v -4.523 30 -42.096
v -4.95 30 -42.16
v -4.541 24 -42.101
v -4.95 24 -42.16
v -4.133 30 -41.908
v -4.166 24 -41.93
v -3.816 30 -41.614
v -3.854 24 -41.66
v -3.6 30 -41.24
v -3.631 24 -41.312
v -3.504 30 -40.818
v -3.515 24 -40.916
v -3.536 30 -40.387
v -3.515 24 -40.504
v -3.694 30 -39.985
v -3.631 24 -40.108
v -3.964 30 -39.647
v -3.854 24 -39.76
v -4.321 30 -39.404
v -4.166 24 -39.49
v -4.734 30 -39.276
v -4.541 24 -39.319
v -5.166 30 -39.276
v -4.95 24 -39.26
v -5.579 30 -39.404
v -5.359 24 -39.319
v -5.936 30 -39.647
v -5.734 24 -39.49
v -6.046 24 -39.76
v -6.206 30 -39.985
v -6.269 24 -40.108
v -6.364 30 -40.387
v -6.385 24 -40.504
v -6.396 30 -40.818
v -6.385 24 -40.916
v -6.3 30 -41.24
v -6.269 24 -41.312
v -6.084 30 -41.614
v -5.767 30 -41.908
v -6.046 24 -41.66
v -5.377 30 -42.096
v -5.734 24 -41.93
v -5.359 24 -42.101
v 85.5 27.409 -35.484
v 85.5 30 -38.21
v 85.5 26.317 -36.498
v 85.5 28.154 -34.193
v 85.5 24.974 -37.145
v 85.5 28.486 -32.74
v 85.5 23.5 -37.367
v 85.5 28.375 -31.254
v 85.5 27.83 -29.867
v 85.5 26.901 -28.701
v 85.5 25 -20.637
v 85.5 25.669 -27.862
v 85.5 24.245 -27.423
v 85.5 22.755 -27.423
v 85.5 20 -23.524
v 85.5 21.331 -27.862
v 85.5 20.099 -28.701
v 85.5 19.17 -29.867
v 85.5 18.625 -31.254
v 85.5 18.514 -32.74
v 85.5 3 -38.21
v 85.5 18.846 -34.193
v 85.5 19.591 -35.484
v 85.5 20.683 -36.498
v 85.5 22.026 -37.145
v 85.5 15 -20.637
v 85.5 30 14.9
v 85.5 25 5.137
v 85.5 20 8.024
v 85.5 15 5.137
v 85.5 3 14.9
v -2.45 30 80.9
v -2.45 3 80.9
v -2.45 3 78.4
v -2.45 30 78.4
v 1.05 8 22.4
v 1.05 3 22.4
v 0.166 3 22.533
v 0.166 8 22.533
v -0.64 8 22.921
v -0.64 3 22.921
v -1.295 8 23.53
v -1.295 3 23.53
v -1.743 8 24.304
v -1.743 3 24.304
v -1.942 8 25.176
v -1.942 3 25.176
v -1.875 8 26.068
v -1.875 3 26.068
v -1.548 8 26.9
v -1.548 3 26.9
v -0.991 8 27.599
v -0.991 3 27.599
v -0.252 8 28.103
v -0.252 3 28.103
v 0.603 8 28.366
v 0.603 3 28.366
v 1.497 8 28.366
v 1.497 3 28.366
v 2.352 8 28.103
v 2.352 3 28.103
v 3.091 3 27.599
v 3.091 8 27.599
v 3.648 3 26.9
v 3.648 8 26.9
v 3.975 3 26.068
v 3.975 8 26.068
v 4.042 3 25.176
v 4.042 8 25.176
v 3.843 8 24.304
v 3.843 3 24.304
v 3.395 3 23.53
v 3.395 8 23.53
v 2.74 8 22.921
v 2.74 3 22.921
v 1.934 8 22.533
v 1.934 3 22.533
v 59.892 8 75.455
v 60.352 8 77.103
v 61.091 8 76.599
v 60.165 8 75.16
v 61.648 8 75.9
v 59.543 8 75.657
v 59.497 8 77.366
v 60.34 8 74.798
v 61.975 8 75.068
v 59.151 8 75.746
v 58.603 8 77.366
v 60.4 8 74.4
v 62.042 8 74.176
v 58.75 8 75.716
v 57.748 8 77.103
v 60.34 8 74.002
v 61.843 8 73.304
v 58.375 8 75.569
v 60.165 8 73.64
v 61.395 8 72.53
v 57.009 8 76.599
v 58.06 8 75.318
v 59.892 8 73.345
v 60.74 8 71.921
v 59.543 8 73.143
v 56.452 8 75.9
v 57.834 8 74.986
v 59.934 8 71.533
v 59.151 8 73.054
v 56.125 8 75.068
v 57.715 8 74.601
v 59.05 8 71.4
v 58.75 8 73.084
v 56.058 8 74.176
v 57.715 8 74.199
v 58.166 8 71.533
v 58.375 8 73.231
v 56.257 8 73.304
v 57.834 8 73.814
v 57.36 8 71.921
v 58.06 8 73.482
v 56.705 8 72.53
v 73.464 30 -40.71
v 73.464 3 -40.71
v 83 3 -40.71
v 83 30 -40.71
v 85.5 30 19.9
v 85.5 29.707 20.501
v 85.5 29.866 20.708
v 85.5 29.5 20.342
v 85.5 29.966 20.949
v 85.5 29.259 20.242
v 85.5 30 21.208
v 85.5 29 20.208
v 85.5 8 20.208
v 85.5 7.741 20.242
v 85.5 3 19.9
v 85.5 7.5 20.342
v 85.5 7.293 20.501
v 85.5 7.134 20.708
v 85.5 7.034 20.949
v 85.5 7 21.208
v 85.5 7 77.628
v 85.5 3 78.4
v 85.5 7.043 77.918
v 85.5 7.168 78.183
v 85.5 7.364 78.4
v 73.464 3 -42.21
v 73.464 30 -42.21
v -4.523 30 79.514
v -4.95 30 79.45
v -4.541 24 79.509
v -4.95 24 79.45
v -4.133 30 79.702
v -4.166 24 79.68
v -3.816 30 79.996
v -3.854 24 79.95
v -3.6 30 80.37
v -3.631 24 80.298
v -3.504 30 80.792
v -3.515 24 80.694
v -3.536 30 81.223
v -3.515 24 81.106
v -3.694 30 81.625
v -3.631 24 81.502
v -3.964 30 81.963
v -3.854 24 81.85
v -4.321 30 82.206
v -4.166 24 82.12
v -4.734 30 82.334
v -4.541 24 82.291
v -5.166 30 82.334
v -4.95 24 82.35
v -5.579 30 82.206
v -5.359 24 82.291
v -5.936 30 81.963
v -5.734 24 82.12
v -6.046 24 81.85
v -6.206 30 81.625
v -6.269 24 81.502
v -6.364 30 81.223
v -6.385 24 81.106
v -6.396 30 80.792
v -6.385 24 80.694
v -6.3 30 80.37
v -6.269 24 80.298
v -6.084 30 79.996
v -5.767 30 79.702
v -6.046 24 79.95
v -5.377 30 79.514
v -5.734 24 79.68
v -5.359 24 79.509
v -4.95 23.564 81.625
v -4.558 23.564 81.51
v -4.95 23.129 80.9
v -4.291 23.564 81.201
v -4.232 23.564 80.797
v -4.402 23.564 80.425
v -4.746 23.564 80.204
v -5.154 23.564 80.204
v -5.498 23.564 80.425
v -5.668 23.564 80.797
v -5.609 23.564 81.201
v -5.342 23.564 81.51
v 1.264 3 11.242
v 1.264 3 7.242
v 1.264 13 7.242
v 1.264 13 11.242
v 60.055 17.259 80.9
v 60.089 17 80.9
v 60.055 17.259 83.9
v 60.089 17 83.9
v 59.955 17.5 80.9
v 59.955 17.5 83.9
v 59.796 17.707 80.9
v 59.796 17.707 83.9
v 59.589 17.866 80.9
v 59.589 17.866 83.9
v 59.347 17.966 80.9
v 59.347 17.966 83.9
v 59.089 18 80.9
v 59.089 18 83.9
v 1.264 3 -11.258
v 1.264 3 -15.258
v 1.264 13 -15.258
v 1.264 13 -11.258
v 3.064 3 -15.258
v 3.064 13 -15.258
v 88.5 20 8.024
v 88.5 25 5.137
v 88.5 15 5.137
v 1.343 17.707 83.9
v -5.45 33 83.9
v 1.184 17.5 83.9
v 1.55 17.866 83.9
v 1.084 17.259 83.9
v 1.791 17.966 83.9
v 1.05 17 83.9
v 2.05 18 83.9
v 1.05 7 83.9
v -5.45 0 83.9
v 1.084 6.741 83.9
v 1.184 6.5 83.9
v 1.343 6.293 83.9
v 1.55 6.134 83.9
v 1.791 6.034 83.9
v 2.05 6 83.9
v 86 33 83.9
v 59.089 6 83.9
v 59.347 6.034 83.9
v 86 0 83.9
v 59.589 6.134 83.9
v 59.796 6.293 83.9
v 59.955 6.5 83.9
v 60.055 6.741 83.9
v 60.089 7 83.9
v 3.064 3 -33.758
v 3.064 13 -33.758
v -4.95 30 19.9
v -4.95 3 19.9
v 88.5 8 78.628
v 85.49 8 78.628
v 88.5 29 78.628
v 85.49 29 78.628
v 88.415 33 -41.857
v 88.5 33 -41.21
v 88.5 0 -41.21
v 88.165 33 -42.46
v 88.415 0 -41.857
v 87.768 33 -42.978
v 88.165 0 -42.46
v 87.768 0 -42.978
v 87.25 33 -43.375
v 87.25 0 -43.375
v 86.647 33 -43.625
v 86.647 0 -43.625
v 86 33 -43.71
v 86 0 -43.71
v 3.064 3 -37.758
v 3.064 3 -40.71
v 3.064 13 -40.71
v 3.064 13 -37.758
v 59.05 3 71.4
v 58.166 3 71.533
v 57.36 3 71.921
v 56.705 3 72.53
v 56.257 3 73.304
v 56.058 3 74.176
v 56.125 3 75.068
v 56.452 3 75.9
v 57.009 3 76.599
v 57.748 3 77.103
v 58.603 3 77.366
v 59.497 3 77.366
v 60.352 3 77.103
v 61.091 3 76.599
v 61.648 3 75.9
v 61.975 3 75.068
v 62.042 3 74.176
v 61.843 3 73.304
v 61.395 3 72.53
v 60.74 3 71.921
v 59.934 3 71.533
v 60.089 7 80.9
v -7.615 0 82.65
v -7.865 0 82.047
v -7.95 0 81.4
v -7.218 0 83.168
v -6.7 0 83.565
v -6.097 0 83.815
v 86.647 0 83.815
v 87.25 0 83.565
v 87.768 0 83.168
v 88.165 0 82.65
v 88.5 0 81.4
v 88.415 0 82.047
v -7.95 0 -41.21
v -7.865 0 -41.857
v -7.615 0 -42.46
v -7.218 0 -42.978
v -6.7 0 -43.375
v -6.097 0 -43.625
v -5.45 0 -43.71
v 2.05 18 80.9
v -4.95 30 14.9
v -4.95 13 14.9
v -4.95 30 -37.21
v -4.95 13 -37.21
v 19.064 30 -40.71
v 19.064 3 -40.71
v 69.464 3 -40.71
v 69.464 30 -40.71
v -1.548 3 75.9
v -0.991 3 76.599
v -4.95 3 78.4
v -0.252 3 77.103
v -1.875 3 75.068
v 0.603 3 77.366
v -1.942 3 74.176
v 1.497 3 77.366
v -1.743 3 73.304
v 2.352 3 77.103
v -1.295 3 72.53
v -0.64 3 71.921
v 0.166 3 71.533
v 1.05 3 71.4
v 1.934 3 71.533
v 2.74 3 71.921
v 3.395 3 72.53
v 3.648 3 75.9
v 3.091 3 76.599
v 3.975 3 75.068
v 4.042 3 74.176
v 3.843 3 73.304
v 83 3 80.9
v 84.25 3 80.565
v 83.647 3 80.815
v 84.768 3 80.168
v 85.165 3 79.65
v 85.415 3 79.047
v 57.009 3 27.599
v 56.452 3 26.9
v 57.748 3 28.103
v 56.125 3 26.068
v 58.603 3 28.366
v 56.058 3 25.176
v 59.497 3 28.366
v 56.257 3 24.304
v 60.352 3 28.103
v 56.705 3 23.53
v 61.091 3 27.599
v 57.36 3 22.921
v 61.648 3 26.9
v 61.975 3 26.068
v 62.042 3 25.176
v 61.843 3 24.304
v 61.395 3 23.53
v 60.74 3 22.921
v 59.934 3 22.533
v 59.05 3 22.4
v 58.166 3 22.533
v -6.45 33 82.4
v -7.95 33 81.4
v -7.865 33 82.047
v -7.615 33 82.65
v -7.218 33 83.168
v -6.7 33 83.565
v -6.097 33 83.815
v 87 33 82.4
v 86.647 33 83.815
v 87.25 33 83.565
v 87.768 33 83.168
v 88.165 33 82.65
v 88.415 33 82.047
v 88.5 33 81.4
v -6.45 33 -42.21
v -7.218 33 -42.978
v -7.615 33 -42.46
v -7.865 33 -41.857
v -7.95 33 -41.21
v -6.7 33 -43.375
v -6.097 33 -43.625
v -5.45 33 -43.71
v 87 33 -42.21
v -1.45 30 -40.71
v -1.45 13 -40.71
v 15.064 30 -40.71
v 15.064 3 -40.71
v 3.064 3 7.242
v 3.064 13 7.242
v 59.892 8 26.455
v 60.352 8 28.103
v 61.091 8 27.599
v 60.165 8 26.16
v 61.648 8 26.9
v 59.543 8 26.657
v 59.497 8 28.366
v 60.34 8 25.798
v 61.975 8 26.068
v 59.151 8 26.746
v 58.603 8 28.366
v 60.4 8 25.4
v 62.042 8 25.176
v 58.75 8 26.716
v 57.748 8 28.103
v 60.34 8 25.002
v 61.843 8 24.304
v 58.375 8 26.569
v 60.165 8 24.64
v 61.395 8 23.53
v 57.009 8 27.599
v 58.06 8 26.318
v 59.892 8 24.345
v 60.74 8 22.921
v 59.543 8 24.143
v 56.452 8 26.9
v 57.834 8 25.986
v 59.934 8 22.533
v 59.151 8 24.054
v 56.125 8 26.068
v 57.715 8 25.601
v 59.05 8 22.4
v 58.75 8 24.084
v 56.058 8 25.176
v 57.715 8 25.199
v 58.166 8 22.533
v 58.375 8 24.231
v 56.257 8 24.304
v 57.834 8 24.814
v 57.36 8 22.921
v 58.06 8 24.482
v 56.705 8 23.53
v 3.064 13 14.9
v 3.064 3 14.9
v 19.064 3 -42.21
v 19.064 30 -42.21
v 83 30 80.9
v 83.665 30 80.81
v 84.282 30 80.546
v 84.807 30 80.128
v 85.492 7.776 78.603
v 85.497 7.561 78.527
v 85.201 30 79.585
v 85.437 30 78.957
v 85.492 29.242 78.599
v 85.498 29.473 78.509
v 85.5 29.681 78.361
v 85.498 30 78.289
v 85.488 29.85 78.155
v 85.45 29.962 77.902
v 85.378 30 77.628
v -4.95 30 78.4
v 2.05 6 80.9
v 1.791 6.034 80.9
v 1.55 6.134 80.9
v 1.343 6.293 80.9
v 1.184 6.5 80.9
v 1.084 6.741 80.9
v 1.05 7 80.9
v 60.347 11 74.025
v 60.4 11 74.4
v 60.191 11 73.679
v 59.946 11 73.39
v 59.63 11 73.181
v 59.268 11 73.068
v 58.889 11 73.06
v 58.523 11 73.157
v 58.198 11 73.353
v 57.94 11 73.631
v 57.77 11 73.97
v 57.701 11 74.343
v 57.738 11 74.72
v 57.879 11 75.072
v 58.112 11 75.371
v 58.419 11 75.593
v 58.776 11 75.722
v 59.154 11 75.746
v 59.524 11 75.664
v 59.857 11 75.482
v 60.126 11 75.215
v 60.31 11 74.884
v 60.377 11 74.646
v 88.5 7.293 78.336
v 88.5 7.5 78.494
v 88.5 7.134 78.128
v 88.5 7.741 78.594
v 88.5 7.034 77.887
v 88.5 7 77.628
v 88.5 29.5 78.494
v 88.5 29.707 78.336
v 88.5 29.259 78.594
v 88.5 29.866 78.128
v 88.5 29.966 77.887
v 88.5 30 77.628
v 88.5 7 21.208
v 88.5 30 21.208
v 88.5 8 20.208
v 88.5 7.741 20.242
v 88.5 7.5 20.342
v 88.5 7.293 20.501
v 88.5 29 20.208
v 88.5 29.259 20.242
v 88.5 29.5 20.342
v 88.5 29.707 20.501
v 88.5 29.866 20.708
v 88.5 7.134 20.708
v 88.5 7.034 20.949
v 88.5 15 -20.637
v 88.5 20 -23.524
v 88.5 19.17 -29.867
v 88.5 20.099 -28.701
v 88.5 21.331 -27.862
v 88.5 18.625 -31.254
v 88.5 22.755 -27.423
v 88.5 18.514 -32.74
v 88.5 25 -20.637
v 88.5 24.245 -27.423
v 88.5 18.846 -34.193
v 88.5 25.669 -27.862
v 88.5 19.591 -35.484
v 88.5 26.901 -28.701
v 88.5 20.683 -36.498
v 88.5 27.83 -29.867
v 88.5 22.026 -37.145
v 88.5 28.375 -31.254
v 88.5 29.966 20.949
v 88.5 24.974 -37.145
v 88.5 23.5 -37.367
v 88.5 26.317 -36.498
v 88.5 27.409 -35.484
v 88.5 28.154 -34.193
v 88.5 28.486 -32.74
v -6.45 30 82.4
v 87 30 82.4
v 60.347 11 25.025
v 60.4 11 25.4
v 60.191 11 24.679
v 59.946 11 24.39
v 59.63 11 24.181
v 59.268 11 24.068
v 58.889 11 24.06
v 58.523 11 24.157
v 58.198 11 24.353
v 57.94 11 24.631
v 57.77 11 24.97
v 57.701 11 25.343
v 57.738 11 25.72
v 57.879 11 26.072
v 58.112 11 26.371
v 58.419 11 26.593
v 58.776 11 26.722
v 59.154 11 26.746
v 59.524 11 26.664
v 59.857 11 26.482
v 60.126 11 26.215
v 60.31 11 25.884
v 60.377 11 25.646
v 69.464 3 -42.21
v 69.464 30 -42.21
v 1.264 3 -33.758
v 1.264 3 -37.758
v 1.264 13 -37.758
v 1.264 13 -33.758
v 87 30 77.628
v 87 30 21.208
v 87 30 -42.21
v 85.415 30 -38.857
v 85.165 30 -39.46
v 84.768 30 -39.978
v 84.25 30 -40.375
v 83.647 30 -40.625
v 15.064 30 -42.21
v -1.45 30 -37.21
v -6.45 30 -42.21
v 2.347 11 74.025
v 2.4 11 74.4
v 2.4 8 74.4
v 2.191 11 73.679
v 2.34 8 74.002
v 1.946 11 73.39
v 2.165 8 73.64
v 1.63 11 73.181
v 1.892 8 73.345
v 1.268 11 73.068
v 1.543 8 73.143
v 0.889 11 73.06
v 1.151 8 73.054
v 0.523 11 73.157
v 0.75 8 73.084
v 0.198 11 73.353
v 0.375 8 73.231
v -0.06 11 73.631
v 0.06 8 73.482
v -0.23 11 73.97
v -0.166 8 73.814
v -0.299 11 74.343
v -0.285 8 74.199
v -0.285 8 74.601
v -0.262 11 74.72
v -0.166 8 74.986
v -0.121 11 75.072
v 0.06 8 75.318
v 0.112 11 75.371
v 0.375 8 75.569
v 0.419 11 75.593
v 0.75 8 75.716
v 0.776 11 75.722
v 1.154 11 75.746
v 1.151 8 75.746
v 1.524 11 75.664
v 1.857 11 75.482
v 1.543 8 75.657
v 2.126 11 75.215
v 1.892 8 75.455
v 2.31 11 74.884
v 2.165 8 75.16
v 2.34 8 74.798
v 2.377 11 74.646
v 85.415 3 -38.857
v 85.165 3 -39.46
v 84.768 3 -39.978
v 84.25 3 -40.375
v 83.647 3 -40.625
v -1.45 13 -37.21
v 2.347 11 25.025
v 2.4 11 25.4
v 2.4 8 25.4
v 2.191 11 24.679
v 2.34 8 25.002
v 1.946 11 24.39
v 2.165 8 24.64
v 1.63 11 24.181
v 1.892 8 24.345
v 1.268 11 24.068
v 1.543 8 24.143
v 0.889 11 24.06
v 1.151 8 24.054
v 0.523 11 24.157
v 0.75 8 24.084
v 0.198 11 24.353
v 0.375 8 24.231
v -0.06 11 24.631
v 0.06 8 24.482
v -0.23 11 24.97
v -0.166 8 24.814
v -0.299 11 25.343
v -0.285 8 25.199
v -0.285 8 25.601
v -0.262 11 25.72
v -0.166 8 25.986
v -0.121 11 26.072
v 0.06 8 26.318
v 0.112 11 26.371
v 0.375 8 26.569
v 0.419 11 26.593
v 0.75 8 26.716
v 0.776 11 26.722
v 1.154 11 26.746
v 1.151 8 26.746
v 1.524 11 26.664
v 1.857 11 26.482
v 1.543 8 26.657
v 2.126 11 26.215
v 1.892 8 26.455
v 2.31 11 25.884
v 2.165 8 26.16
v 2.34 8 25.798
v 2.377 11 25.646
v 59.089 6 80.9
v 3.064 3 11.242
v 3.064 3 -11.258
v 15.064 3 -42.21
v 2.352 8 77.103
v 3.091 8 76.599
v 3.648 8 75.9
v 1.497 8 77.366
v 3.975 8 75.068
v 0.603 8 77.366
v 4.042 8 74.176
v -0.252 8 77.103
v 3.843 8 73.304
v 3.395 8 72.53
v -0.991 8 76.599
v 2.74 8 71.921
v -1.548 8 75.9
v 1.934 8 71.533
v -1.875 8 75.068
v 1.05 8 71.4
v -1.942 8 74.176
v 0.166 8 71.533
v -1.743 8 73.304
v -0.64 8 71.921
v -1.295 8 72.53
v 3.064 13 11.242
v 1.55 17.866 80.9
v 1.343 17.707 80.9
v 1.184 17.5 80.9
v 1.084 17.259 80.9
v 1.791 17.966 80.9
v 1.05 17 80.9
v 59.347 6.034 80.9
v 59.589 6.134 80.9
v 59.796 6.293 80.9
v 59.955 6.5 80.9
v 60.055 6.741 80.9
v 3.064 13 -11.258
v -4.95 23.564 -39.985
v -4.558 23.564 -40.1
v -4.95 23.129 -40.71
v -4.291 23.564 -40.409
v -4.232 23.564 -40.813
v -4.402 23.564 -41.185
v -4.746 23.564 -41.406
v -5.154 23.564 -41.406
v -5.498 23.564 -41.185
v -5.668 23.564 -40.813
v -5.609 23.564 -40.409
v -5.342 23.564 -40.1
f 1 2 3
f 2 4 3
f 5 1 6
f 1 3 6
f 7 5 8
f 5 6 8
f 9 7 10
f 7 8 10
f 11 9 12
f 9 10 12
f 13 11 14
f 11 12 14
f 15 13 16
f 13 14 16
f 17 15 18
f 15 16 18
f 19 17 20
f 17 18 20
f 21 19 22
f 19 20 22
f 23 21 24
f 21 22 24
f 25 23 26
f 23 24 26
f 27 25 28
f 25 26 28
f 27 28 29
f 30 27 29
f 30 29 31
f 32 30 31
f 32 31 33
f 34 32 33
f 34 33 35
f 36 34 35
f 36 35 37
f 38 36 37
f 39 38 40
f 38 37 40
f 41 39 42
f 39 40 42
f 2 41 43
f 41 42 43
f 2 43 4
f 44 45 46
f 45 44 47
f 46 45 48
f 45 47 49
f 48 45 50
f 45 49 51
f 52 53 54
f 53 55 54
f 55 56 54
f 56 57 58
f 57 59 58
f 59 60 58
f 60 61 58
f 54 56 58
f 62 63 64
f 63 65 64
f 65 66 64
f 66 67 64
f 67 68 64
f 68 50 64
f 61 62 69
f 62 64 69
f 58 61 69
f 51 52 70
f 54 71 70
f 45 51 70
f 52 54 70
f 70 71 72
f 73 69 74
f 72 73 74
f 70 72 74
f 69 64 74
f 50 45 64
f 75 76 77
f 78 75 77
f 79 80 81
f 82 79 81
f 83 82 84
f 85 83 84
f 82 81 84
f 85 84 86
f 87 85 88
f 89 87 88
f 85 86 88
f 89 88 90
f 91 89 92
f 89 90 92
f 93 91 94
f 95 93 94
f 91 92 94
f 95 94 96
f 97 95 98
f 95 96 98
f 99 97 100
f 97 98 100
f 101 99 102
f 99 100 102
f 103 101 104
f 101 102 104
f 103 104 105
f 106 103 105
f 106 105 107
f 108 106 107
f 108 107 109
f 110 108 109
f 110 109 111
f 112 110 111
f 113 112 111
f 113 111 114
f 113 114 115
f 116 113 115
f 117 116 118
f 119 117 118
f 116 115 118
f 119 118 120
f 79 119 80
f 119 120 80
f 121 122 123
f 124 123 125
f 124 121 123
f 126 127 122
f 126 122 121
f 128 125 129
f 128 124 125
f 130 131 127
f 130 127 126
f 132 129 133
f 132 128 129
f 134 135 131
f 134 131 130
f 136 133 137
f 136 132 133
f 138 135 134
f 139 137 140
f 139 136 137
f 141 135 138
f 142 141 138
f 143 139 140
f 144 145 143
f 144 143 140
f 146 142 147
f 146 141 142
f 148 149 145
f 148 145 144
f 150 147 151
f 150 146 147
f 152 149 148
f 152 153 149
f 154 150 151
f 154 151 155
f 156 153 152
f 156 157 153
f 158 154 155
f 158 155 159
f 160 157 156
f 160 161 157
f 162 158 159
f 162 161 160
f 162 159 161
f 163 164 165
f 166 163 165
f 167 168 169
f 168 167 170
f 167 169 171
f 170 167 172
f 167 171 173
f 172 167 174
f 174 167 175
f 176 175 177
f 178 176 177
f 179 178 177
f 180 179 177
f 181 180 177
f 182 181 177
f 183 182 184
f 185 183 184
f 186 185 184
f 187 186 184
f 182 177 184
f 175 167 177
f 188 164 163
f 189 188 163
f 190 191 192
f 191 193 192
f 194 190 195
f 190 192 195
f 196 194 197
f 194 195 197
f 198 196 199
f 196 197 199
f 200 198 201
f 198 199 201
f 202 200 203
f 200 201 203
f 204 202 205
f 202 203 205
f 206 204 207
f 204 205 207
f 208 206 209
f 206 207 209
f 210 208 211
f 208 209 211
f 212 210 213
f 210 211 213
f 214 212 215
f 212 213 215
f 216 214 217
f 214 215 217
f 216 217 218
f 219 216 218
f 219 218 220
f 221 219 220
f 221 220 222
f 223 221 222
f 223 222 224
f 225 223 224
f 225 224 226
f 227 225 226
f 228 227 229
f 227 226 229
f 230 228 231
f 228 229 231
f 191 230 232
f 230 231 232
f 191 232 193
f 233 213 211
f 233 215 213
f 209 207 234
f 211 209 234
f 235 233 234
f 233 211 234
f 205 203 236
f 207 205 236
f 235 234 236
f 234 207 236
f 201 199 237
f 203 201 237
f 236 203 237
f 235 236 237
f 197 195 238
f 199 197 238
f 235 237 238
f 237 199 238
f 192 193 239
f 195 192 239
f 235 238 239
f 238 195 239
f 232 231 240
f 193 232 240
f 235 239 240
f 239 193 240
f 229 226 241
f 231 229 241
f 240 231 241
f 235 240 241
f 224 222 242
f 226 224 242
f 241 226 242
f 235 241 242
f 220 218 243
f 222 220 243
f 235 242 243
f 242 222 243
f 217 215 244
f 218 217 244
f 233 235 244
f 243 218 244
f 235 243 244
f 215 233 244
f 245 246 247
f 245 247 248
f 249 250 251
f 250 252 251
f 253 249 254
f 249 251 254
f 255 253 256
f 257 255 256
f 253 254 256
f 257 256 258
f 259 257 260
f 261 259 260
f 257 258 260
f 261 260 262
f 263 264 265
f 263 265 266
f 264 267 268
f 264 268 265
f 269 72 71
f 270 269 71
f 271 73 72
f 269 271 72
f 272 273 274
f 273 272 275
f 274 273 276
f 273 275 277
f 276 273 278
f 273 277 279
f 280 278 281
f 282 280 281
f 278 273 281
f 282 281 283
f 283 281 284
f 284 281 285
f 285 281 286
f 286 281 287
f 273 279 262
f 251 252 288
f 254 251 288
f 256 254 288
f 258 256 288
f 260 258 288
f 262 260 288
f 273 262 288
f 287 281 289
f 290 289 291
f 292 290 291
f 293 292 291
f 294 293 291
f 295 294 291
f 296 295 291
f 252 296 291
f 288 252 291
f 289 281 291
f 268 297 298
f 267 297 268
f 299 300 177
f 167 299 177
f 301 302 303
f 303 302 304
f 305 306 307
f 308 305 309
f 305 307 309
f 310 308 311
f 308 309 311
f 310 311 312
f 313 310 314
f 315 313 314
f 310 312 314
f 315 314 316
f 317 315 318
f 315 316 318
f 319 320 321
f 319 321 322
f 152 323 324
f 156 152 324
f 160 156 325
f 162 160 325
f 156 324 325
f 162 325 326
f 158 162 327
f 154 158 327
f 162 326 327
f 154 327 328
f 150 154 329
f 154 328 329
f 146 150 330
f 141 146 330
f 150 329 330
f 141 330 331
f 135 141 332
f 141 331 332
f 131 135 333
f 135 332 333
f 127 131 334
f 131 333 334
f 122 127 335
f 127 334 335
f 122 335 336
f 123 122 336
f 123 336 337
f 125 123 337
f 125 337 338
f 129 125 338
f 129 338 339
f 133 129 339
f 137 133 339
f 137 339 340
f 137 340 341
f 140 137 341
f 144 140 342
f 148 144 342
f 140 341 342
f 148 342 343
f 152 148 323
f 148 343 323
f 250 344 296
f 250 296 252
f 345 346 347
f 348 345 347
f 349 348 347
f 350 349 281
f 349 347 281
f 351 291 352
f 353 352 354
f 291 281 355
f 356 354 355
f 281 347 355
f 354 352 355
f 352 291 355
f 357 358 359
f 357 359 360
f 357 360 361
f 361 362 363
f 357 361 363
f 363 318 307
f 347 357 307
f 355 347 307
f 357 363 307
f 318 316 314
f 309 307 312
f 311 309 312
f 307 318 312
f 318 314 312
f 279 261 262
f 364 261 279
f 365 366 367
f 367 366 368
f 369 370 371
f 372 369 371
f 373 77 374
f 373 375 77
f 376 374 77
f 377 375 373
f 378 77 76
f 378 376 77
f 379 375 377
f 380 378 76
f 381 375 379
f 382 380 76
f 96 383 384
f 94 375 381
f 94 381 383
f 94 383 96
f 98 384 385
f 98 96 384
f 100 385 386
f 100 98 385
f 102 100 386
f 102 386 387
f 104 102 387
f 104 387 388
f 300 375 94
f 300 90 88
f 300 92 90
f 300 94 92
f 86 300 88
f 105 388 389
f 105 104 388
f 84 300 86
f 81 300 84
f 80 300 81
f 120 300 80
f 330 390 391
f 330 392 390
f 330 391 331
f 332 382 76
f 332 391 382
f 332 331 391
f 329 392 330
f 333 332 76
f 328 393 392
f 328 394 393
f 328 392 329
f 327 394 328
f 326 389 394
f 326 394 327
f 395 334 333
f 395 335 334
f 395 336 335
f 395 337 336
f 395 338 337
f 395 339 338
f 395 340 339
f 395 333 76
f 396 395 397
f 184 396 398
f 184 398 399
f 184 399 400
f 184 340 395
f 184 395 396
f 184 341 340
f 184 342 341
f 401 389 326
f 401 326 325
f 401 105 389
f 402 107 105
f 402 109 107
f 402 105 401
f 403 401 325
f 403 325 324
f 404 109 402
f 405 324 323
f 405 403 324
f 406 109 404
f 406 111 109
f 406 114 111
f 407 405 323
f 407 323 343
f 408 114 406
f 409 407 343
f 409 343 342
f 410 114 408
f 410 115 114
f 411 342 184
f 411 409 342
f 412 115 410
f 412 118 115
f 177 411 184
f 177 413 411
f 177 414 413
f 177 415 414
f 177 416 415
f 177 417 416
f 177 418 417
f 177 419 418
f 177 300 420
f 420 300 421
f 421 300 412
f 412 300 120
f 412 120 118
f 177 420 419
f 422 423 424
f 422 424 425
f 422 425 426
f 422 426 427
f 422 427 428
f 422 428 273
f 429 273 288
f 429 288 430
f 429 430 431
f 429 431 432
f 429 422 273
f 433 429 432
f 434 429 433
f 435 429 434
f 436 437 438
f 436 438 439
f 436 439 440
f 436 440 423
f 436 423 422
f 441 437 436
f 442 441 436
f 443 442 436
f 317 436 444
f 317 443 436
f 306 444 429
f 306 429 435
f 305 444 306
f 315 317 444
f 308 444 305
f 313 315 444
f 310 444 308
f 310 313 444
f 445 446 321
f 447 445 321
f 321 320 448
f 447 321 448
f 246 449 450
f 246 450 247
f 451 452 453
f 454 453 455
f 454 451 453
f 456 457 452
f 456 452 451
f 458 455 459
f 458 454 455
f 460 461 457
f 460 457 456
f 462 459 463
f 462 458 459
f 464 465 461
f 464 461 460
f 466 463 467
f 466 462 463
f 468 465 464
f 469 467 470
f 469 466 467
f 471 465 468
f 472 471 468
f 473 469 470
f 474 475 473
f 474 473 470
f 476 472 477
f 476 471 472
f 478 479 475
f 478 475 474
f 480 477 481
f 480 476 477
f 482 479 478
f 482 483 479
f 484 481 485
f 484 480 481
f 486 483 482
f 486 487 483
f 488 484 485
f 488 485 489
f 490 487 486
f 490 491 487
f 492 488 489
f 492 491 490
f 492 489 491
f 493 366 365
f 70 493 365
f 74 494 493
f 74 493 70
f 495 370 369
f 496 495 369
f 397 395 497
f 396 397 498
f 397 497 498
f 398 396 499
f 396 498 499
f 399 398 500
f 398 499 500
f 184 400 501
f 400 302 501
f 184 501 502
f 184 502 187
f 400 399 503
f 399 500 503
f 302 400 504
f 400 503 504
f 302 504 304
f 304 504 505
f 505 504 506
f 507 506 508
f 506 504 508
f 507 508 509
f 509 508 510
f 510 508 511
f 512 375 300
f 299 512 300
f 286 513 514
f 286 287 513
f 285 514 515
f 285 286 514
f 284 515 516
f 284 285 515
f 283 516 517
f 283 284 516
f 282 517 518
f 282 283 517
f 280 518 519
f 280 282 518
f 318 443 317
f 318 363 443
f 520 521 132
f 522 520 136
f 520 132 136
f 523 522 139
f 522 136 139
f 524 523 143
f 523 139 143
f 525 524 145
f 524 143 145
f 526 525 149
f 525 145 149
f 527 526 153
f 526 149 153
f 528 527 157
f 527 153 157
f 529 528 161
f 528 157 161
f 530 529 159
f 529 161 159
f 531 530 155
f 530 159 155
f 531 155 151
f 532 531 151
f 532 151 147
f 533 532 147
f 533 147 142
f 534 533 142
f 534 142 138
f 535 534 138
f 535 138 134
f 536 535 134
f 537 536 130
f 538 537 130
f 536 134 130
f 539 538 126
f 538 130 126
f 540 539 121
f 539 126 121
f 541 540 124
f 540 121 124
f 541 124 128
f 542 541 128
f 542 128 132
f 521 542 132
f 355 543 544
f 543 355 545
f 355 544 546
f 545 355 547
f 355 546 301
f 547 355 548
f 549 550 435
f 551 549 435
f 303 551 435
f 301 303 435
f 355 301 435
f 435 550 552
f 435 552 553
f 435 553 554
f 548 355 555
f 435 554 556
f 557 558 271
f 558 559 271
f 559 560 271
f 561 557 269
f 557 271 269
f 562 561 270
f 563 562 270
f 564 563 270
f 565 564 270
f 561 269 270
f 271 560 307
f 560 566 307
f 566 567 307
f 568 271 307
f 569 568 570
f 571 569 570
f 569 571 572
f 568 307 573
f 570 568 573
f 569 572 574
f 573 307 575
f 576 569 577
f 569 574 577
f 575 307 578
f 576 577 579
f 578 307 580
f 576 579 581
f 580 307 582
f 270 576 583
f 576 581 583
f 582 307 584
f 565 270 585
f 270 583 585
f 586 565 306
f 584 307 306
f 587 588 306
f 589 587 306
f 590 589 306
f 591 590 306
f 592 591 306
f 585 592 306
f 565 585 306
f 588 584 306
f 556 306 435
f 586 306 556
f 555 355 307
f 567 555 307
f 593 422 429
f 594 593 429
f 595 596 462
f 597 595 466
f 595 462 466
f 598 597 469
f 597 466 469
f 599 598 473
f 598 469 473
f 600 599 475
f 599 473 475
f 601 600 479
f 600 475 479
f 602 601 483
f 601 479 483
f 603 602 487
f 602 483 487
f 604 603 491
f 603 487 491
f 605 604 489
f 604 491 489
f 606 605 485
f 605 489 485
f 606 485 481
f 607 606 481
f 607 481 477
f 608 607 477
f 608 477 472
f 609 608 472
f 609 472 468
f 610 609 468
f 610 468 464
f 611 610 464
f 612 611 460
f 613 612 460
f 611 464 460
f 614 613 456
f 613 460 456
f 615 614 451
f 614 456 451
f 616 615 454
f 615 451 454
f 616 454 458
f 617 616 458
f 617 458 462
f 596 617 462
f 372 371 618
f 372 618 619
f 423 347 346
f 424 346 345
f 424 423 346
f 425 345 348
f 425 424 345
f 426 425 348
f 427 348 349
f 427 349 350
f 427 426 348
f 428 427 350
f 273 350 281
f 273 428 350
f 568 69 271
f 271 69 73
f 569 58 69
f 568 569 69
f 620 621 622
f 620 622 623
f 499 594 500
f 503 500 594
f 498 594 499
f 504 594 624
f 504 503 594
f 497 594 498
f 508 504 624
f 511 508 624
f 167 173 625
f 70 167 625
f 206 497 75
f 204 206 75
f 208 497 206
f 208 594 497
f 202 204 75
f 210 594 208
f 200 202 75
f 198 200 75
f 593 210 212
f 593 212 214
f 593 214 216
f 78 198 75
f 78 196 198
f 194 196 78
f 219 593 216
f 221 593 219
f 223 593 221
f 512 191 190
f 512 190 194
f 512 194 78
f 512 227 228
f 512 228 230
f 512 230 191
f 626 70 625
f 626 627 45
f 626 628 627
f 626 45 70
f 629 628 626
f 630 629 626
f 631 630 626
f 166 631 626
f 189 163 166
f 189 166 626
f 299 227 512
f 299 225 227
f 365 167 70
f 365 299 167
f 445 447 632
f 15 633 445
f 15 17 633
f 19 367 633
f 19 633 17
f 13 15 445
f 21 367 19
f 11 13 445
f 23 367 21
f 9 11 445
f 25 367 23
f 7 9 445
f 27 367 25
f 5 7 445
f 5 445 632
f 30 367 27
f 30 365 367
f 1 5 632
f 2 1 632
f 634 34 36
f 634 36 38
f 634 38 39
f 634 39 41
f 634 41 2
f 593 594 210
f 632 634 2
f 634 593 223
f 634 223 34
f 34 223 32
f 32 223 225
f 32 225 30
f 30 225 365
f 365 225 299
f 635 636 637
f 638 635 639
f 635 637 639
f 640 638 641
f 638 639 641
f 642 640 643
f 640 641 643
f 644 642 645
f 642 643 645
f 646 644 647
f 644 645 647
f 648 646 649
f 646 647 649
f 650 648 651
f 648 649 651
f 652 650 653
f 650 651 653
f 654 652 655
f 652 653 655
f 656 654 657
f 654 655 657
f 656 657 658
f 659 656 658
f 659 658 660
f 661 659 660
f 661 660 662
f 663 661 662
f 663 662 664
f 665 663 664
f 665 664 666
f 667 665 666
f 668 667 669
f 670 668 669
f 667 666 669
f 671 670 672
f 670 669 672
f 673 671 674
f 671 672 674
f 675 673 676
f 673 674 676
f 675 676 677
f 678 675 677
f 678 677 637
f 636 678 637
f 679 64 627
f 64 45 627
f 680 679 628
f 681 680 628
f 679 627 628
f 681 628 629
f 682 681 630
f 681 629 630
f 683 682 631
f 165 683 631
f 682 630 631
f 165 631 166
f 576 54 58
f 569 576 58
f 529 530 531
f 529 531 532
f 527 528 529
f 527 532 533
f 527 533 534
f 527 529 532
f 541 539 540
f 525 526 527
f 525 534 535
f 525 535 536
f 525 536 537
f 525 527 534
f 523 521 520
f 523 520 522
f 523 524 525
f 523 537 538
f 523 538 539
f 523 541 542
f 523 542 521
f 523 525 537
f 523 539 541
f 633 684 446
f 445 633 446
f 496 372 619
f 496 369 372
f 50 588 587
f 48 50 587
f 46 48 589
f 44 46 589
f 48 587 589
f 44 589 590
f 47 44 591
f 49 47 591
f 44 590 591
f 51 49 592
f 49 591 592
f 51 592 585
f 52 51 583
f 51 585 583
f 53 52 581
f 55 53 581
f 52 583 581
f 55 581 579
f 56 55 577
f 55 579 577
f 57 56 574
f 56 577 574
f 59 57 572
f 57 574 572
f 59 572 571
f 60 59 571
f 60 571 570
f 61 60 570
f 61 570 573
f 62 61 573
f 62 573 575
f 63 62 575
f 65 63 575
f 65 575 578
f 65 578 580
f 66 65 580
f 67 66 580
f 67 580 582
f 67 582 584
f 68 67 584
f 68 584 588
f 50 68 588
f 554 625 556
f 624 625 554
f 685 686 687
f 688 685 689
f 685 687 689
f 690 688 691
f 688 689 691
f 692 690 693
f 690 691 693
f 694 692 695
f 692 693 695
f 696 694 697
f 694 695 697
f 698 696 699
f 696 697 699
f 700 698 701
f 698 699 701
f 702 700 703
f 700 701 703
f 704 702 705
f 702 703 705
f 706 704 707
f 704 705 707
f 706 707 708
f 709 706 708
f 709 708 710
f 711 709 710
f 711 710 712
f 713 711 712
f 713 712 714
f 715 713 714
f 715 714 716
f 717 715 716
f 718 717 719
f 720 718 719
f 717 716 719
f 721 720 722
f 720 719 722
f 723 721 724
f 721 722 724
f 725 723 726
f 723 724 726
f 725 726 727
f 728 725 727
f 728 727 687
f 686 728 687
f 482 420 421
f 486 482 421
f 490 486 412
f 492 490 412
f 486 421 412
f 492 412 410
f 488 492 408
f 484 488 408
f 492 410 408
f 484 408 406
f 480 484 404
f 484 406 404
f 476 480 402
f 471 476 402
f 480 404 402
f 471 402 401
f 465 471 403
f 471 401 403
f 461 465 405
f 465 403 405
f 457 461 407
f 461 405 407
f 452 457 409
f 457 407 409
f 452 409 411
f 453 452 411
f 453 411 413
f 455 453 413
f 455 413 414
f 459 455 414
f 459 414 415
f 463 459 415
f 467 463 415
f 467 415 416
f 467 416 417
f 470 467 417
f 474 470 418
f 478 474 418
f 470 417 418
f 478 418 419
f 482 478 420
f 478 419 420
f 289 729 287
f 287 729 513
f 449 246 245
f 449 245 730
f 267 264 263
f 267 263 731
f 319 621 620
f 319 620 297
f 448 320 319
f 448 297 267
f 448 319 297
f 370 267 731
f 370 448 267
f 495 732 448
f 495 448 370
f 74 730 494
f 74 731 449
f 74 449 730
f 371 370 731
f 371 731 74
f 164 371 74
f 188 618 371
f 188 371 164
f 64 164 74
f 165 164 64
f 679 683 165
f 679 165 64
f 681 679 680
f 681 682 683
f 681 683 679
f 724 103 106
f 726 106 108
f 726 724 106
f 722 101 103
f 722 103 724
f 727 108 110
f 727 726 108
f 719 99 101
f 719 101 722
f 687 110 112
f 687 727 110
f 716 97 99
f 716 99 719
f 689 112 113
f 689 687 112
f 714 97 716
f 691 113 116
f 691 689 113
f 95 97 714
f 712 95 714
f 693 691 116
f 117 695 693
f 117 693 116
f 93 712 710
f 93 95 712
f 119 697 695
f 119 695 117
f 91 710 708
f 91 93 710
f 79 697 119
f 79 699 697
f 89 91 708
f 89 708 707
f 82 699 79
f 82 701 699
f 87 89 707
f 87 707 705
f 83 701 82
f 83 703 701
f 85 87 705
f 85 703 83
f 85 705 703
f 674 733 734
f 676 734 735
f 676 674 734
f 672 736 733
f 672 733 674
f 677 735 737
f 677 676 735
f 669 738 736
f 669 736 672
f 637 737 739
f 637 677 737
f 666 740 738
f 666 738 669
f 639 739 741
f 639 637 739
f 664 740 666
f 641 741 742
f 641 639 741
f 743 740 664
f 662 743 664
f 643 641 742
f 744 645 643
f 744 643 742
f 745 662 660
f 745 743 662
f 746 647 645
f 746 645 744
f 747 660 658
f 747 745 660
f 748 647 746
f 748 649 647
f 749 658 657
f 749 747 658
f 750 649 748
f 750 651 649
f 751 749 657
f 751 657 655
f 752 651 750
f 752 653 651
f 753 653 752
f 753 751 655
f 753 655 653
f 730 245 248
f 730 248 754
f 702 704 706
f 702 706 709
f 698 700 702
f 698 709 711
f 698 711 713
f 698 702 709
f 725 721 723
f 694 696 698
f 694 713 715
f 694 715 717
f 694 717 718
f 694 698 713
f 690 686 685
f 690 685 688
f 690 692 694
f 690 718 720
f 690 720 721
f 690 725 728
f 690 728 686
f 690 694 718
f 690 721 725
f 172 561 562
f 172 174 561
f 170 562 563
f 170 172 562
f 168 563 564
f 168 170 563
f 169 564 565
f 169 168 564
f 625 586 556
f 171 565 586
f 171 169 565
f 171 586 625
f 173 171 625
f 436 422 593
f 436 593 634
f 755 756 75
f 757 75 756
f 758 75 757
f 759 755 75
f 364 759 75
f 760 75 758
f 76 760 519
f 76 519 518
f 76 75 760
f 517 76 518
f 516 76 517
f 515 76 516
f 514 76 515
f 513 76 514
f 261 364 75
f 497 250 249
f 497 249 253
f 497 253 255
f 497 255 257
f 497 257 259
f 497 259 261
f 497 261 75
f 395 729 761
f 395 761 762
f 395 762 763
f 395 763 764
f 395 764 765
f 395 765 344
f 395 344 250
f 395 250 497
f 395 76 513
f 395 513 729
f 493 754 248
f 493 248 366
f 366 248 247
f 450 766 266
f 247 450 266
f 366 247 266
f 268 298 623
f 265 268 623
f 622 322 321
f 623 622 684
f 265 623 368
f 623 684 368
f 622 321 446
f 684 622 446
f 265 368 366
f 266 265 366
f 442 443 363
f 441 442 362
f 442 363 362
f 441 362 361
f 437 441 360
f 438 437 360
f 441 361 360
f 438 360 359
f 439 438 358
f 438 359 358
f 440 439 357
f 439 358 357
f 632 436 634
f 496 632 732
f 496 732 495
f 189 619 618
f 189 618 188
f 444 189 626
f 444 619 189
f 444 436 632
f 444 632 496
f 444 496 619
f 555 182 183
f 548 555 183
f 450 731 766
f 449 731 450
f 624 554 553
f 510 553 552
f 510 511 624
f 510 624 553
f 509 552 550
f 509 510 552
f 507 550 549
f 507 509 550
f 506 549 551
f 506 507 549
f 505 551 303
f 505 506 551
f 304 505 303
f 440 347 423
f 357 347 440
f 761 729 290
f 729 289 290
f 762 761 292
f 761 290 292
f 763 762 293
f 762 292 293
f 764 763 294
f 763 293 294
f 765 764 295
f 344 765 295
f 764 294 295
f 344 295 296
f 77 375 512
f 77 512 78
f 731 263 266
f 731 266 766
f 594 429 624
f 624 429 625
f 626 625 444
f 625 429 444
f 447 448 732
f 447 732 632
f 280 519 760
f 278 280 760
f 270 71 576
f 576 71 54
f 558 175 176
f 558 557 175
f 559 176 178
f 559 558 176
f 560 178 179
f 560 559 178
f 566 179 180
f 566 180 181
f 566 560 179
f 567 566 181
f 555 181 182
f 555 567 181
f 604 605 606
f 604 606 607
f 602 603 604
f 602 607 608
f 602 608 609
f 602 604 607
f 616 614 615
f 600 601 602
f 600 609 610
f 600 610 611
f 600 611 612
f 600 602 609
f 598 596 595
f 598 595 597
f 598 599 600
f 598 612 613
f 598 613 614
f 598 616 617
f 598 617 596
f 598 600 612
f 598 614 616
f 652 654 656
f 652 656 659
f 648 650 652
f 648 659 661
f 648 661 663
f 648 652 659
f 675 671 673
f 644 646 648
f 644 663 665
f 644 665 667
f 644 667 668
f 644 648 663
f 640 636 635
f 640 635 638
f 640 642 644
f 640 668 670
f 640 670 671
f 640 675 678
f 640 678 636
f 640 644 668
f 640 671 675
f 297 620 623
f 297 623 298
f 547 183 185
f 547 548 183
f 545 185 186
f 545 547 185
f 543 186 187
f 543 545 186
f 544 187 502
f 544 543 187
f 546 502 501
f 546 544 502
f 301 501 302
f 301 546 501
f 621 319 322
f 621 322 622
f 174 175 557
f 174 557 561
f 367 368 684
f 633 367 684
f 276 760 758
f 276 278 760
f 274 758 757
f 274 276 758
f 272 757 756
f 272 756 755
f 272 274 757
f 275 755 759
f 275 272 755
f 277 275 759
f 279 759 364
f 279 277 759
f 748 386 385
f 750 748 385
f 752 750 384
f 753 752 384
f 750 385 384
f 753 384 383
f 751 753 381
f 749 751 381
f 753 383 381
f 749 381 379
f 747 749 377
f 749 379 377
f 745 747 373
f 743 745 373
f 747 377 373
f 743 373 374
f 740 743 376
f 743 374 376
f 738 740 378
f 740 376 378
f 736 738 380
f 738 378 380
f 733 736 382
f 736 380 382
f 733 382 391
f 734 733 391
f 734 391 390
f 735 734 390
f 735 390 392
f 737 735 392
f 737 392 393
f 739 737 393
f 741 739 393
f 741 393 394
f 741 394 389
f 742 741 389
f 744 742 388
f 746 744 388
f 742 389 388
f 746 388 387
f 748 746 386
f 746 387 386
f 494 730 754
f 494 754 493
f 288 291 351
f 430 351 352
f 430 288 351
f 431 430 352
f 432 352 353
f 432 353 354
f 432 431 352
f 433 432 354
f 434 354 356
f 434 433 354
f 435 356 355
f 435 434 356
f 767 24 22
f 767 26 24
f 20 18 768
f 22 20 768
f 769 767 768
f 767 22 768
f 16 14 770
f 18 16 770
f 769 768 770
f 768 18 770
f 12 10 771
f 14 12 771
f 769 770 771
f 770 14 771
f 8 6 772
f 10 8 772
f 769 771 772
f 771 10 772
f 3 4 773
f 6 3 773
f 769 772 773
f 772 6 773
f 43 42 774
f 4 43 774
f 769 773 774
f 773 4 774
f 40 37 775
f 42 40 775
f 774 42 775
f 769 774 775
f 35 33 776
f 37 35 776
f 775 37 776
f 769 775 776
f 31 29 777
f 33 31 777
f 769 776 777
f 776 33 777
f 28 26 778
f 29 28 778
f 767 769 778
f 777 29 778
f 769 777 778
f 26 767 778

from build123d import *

# Parameters (mm, degrees)
SKETCH1_W                  = 165
SKETCH1_H                  = 155.8
BOSS_EXTRUDE1_DEPTH        = 3
SKETCH2_R                  = 3
SKETCH2_R_2                = 1.35
BOSS_EXTRUDE2_DEPTH        = 5
SKETCH5_RX                 = 1.35
SKETCH5_RY                 = 1.35
BOSS_EXTRUDE3_DEPTH        = 8
SKETCH6_W                  = 155.8
SKETCH6_H                  = 3
BOSS_EXTRUDE4_DEPTH        = 3
SKETCH7_W                  = 74.55
SKETCH7_H                  = 155.8
CUT_EXTRUDE1_DEPTH         = 3
SKETCH11_W                 = 93.45
SKETCH11_H                 = 34.19
CUT_EXTRUDE2_DEPTH         = 3
SKETCH12_W                 = 121.61
SKETCH12_H                 = 3
BOSS_EXTRUDE5_DEPTH        = 3
SKETCH13_W                 = 96.45
SKETCH13_H                 = 3
BOSS_EXTRUDE6_DEPTH        = 6
SKETCH14_W                 = 96.45
SKETCH14_H                 = 127.61
SKETCH14_W_2               = 90.45
SKETCH14_H_2               = 121.61
BOSS_EXTRUDE8_DEPTH        = 30
SKETCH15_W                 = 58.420771098
SKETCH15_H                 = 23
CUT_EXTRUDE3_DEPTH         = 30
SKETCH16_W                 = 59.038575843
SKETCH16_H                 = 12
CUT_EXTRUDE4_DEPTH         = 30
SKETCH17_W                 = 93.45
SKETCH17_H                 = 124.61
CUT_EXTRUDE5_DEPTH         = 3
CUT_EXTRUDE6_DEPTH         = 3
FILLET1_R                  = 2.5
FILLET3_R                  = 2.5
FILLET4_R                  = 2.5
FILLET5_R                  = 2.5
FILLET6_R                  = 2.5
FILLET7_R                  = 2.5
FILLET8_R                  = 2.5
FILLET9_R                  = 2.5
FILLET10_R                 = 1
FILLET11_R                 = 1
FILLET12_R                 = 1
FILLET13_R                 = 1
FILLET14_R                 = 1
FILLET15_R                 = 1
FILLET16_R                 = 1
FILLET17_R                 = 1
SKETCH23_R                 = 5
CUT_EXTRUDE11_DEPTH        = 10
SKETCH26_W                 = 90.45
SKETCH26_H                 = 5
BOSS_EXTRUDE9_DEPTH        = 27
BOSS_EXTRUDE10_DEPTH       = 10
SKETCH28_W                 = 4
SKETCH28_H                 = 27
CUT_EXTRUDE12_DEPTH        = 1.5
SKETCH29_W                 = 5
SKETCH29_H                 = 5
BOSS_EXTRUDE11_DEPTH       = 17
SKETCH30_W                 = 4
SKETCH30_H                 = 4
BOSS_EXTRUDE12_DEPTH       = 27
M2_5_CLEARANCE_HOLE1_D     = 2.9
M2_5_CLEARANCE_HOLE1_DEPTH = 6
M2_5_CLEARANCE_HOLE1_TIP   = 0.871247898


with BuildPart() as part:
    # Sketch1 → Boss-Extrude1 (new body)
    with BuildSketch(Plane(origin=(0, 0, 0), x_dir=(1, 0, 0), z_dir=(0, 1, 0))):
        Rectangle(SKETCH1_W, SKETCH1_H)
    extrude(amount=BOSS_EXTRUDE1_DEPTH)

    # Sketch2 → Boss-Extrude2 (add)
    with BuildSketch(Plane(origin=(0, 3, 0), x_dir=(1, 0, 0), z_dir=(0, 1, 0))):
        with Locations(Location((1.05, -25.4, 0), (0, 0, 90))):
            Circle(SKETCH2_R)
        with Locations(Location((1.05, -25.4, 0), (0, 0, 270))):
            Circle(SKETCH2_R_2, mode=Mode.SUBTRACT)
    boss_extrude2 = extrude(amount=BOSS_EXTRUDE2_DEPTH)

    # Sketch5 → Boss-Extrude3 (add)
    with BuildSketch(Plane(origin=(0, 3, 0), x_dir=(1, 0, 0), z_dir=(0, 1, 0))):
        with Locations((1.05, -25.4)):
            Ellipse(SKETCH5_RX, SKETCH5_RY)
    boss_extrude3 = extrude(amount=BOSS_EXTRUDE3_DEPTH)

    # Sketch-Pattern1: Boss-Extrude2, Boss-Extrude3 at 3 more places
    with Locations((58, 0, 49), (0, 0, 49), (58, 0, 0)):
        add(boss_extrude2)
        add(boss_extrude3)

    # Sketch6 → Boss-Extrude4 (add)
    with BuildSketch(Plane(origin=(82.5, 0, 0), x_dir=(0, 0, -1), z_dir=(1, 0, 0))):
        with Locations((0, 1.5)):
            Rectangle(SKETCH6_W, SKETCH6_H)
    extrude(amount=BOSS_EXTRUDE4_DEPTH)

    # Sketch7 → Cut-Extrude1 (cut)
    with BuildSketch(Plane(origin=(0, 3, 0), x_dir=(1, 0, 0), z_dir=(0, 1, 0))):
        with Locations((-45.225, 0)):
            Rectangle(SKETCH7_W, SKETCH7_H)
    extrude(amount=-CUT_EXTRUDE1_DEPTH, mode=Mode.SUBTRACT)

    # Sketch11 → Cut-Extrude2 (cut)
    with BuildSketch(Plane(origin=(0, 3, 0), x_dir=(1, 0, 0), z_dir=(0, 1, 0))):
        with Locations((38.775, 60.805)):
            Rectangle(SKETCH11_W, SKETCH11_H)
    extrude(amount=-CUT_EXTRUDE2_DEPTH, mode=Mode.SUBTRACT)

    # Sketch12 → Boss-Extrude5 (add)
    with BuildSketch(Plane(origin=(85.5, 0, 0), x_dir=(0, 0, -1), z_dir=(1, 0, 0))):
        with Locations((-17.095, 1.5)):
            Rectangle(SKETCH12_W, SKETCH12_H)
    extrude(amount=BOSS_EXTRUDE5_DEPTH)

    # Sketch13 → Boss-Extrude6 (add)
    with BuildSketch(Plane.XY.offset(77.9)):
        with Locations((40.275, 1.5)):
            Rectangle(SKETCH13_W, SKETCH13_H)
    extrude(amount=BOSS_EXTRUDE6_DEPTH)

    # Sketch14 → Boss-Extrude8 (add)
    with BuildSketch(Plane(origin=(0, 3, 0), x_dir=(1, 0, 0), z_dir=(0, 1, 0))):
        with Locations((40.275, -20.095)):
            Rectangle(SKETCH14_W, SKETCH14_H)
        with Locations((40.275, -20.095)):
            Rectangle(SKETCH14_W_2, SKETCH14_H_2, mode=Mode.SUBTRACT)
    extrude(amount=BOSS_EXTRUDE8_DEPTH)

    # Sketch15 → Cut-Extrude3 (cut)
    with BuildSketch(Plane.ZY.offset(-85.5)):
        with Locations((49.418063701, 18.5)):
            Rectangle(SKETCH15_W, SKETCH15_H)
    extrude(amount=-CUT_EXTRUDE3_DEPTH, mode=Mode.SUBTRACT)

    # Sketch16 → Cut-Extrude4 (cut)
    with BuildSketch(Plane(origin=(0, 0, 80.9), x_dir=(-1, 0, 0), z_dir=(0, 0, -1))):
        with Locations((-30.569287921, 12)):
            Rectangle(SKETCH16_W, SKETCH16_H)
    extrude(amount=-CUT_EXTRUDE4_DEPTH, mode=Mode.SUBTRACT)

    # Sketch17 → Cut-Extrude5 (cut)
    with BuildSketch(Plane(origin=(0, 33, 0), x_dir=(1, 0, 0), z_dir=(0, 1, 0))):
        with Locations((40.275, -20.095)):
            Rectangle(SKETCH17_W, SKETCH17_H)
    extrude(amount=-CUT_EXTRUDE5_DEPTH, mode=Mode.SUBTRACT)

    # Sketch19 → Cut-Extrude6 (cut)
    with BuildSketch(Plane.ZY.offset(-85.5)):
        Polygon((-14.863248654, 25), (-20.636751346, 25), (-23.523502692, 20), (-20.636751346, 15), (-14.863248654, 15), (-0.636751346, 15), (5.136751346, 15), (8.023502692, 20), (5.136751346, 25), (-0.636751346, 25), align=None)
    extrude(amount=-CUT_EXTRUDE6_DEPTH, mode=Mode.SUBTRACT)

    # Fillet1
    fillet1_edges = [part.edges().sort_by_distance(p)[0] for p in [
        (-7.95, 16.5, 83.9),
    ]]
    fillet(fillet1_edges, radius=FILLET1_R)

    # Fillet3
    fillet3_edges = [part.edges().sort_by_distance(p)[0] for p in [
        (88.5, 16.5, 83.9),
    ]]
    fillet(fillet3_edges, radius=FILLET3_R)

    # Fillet4
    fillet4_edges = [part.edges().sort_by_distance(p)[0] for p in [
        (88.5, 16.5, -43.71),
    ]]
    fillet(fillet4_edges, radius=FILLET4_R)

    # Fillet5
    fillet5_edges = [part.edges().sort_by_distance(p)[0] for p in [
        (-7.95, 16.5, -43.71),
    ]]
    fillet(fillet5_edges, radius=FILLET5_R)

    # Fillet6
    fillet6_edges = [part.edges().sort_by_distance(p)[0] for p in [
        (85.5, 16.5, -40.71),
    ]]
    fillet(fillet6_edges, radius=FILLET6_R)

    # Fillet7
    fillet7_edges = [part.edges().sort_by_distance(p)[0] for p in [
        (-4.95, 16.5, -40.71),
    ]]
    fillet(fillet7_edges, radius=FILLET7_R)

    # Fillet8
    fillet8_edges = [part.edges().sort_by_distance(p)[0] for p in [
        (-4.95, 16.5, 80.9),
    ]]
    fillet(fillet8_edges, radius=FILLET8_R)

    # Fillet9
    fillet9_edges = [part.edges().sort_by_distance(p)[0] for p in [
        (85.5, 16.5, 80.9),
    ]]
    fillet(fillet9_edges, radius=FILLET9_R)

    # Fillet10
    # the kernel refuses this fillet: 1 mm, written as the material it adds along each edge
    with BuildSketch(Plane(origin=(84.5, 30, 78.62844925), x_dir=(0, -1, 0), z_dir=(1, 0, 0))) as fillet10_piece_1_section:
        with BuildLine():
            CenterArc((FILLET10_R, FILLET10_R), FILLET10_R, 180, 90)
            Line((0, FILLET10_R), (0, 0))
            Line((0, 0), (FILLET10_R, 0))
        make_face()
    fillet10_piece_1 = extrude(amount=4, mode=Mode.PRIVATE)
    fillet10_piece_1 = fillet10_piece_1 - Plane(origin=(83, 29.753252257, 78.4), x_dir=(0, 0, 1), z_dir=(0, 1, 0)) * Cylinder(2.5, 12, mode=Mode.PRIVATE)
    fillet10_piece_1 = split(fillet10_piece_1, bisect_by=Plane(origin=(86.246243514, 30, 78.424249714), z_dir=(0, -1, 0)), keep=Keep.TOP, mode=Mode.PRIVATE)
    fillet10_piece_1 = split(fillet10_piece_1, bisect_by=Plane(origin=(87, 29.753252257, 78.424249714), z_dir=(-1, 0, 0)), keep=Keep.TOP, mode=Mode.PRIVATE)
    add(fillet10_piece_1)
    with BuildSketch(Plane(origin=(87, 30, 78.62844925), x_dir=(0, -1, 0), z_dir=(1, 0, 0))) as fillet10_piece_2_section:
        with BuildLine():
            CenterArc((FILLET10_R, FILLET10_R), FILLET10_R, 180, 90)
            Line((0, FILLET10_R), (0, 0))
            Line((0, 0), (FILLET10_R, 0))
        make_face()
    fillet10_piece_2 = extrude(amount=1.5, mode=Mode.PRIVATE)
    fillet10_piece_2 = split(fillet10_piece_2, bisect_by=Plane(origin=(87.75, 30, 78.42497612), z_dir=(0, -1, 0)), keep=Keep.TOP, mode=Mode.PRIVATE)
    add(fillet10_piece_2)

    # Fillet11
    # the kernel refuses this fillet: 1 mm, written as the material it adds along each edge
    with BuildSketch(Plane(origin=(84.5, 30, 20.207678152), x_dir=(0, -1, 0), z_dir=(1, 0, 0))) as fillet11_piece_1_section:
        with BuildLine():
            CenterArc((FILLET11_R, -FILLET11_R), FILLET11_R, 90, 90)
            Line((0, -FILLET11_R), (0, 0))
            Line((0, 0), (FILLET11_R, 0))
        make_face()
    fillet11_piece_1 = extrude(amount=4, mode=Mode.PRIVATE)
    fillet11_piece_1 = split(fillet11_piece_1, bisect_by=Plane(origin=(86.25, 30, 20.411151282), z_dir=(0, -1, 0)), keep=Keep.TOP, mode=Mode.PRIVATE)
    fillet11_piece_1 = split(fillet11_piece_1, bisect_by=Plane(origin=(85.5, 29.75304895, 20.411151282), z_dir=(1, 0, 0)), keep=Keep.TOP, mode=Mode.PRIVATE)
    fillet11_piece_1 = split(fillet11_piece_1, bisect_by=Plane(origin=(87, 29.75304895, 20.411151282), z_dir=(-1, 0, 0)), keep=Keep.TOP, mode=Mode.PRIVATE)
    add(fillet11_piece_1)
    with BuildSketch(Plane(origin=(87, 30, 20.207678152), x_dir=(0, -1, 0), z_dir=(1, 0, 0))) as fillet11_piece_2_section:
        with BuildLine():
            CenterArc((FILLET11_R, -FILLET11_R), FILLET11_R, 90, 90)
            Line((0, -FILLET11_R), (0, 0))
            Line((0, 0), (FILLET11_R, 0))
        make_face()
    fillet11_piece_2 = extrude(amount=1.5, mode=Mode.PRIVATE)
    fillet11_piece_2 = split(fillet11_piece_2, bisect_by=Plane(origin=(87.75, 30, 20.411151282), z_dir=(0, -1, 0)), keep=Keep.TOP, mode=Mode.PRIVATE)
    add(fillet11_piece_2)

    # Fillet12
    fillet12_edges = [part.edges().sort_by_distance(p)[0] for p in [
        (87, 7, 20.207678152),
    ]]
    fillet(fillet12_edges, radius=FILLET12_R)

    # Fillet13
    fillet13_edges = [part.edges().sort_by_distance(p)[0] for p in [
        (86.994770154, 7, 78.62844925),
    ]]
    fillet(fillet13_edges, radius=FILLET13_R)

    # Fillet14
    fillet14_edges = [part.edges().sort_by_distance(p)[0] for p in [
        (1.05, 18, 82.4),
    ]]
    fillet(fillet14_edges, radius=FILLET14_R)

    # Fillet15
    fillet15_edges = [part.edges().sort_by_distance(p)[0] for p in [
        (60.088575843, 6, 82.4),
    ]]
    fillet(fillet15_edges, radius=FILLET15_R)

    # Fillet16
    fillet16_edges = [part.edges().sort_by_distance(p)[0] for p in [
        (60.088575843, 18, 82.4),
    ]]
    fillet(fillet16_edges, radius=FILLET16_R)

    # Fillet17
    fillet17_edges = [part.edges().sort_by_distance(p)[0] for p in [
        (1.05, 6, 82.4),
    ]]
    fillet(fillet17_edges, radius=FILLET17_R)

    # Sketch23 → Cut-Extrude11 (cut)
    with BuildSketch(Plane(origin=(88.5, 0, 0), x_dir=(0, 0, -1), z_dir=(1, 0, 0))):
        with Locations((32.366751346, 23.5)):
            Circle(SKETCH23_R)
    extrude(amount=-CUT_EXTRUDE11_DEPTH, mode=Mode.SUBTRACT)

    # Sketch26 → Boss-Extrude9 (add)
    with BuildSketch(Plane(origin=(0, 3, 0), x_dir=(1, 0, 0), z_dir=(0, 1, 0))):
        with Locations((40.275, -17.4)):
            Rectangle(SKETCH26_W, SKETCH26_H)
    extrude(amount=BOSS_EXTRUDE9_DEPTH)

    # Sketch27 → Boss-Extrude10 (add)
    with BuildSketch(Plane(origin=(0, 3, 0), x_dir=(1, 0, 0), z_dir=(0, 1, 0))):
        Polygon((3.0643, -14.9), (-4.95, -14.9), (-4.95, 40.757951229), (3.0643, 40.757951229), (3.0643, 37.757951229), (1.2643, 37.757951229), (1.2643, 33.757951229), (3.0643, 33.757951229), (3.0643, 15.257951229), (1.2643, 15.257951229), (1.2643, 11.257951229), (3.0643, 11.257951229), (3.0643, -7.242048771), (1.2643, -7.242048771), (1.2643, -11.242048771), (3.0643, -11.242048771), align=None)
    extrude(amount=BOSS_EXTRUDE10_DEPTH)

    # Sketch28 → Cut-Extrude12 (cut)
    with BuildSketch(Plane.XY.offset(-40.71)):
        with Locations((17.0643, 16.5)):
            Rectangle(SKETCH28_W, SKETCH28_H)
        with Locations((71.4643, 16.5)):
            Rectangle(SKETCH28_W, SKETCH28_H)
    extrude(amount=-CUT_EXTRUDE12_DEPTH, mode=Mode.SUBTRACT)

    # Sketch29 → Boss-Extrude11 (add)
    with BuildSketch(Plane(origin=(0, 13, 0), x_dir=(1, 0, 0), z_dir=(0, 1, 0))):
        with Locations((-3.95, 39.71)):
            Rectangle(SKETCH29_W, SKETCH29_H)
    extrude(amount=BOSS_EXTRUDE11_DEPTH)

    # Sketch30 → Boss-Extrude12 (add)
    with BuildSketch(Plane(origin=(0, 3, 0), x_dir=(1, 0, 0), z_dir=(0, 1, 0))):
        with Locations((-4.45, -80.4)):
            Rectangle(SKETCH30_W, SKETCH30_H)
    extrude(amount=BOSS_EXTRUDE12_DEPTH)

    # M2.5 Clearance Hole1
    with Locations(Plane(origin=(-4.95, 30, -40.71), x_dir=(0, 0, 1), z_dir=(0, 1, 0))):
        with Locations((0, 0), (121.61, 0)):
            Hole(M2_5_CLEARANCE_HOLE1_D / 2, depth=M2_5_CLEARANCE_HOLE1_DEPTH)
            with Locations((0, 0, -(M2_5_CLEARANCE_HOLE1_DEPTH + M2_5_CLEARANCE_HOLE1_TIP / 2))):  # 118° drill point
                Cone(0, M2_5_CLEARANCE_HOLE1_D / 2, M2_5_CLEARANCE_HOLE1_TIP, mode=Mode.SUBTRACT)


solid = part.part
